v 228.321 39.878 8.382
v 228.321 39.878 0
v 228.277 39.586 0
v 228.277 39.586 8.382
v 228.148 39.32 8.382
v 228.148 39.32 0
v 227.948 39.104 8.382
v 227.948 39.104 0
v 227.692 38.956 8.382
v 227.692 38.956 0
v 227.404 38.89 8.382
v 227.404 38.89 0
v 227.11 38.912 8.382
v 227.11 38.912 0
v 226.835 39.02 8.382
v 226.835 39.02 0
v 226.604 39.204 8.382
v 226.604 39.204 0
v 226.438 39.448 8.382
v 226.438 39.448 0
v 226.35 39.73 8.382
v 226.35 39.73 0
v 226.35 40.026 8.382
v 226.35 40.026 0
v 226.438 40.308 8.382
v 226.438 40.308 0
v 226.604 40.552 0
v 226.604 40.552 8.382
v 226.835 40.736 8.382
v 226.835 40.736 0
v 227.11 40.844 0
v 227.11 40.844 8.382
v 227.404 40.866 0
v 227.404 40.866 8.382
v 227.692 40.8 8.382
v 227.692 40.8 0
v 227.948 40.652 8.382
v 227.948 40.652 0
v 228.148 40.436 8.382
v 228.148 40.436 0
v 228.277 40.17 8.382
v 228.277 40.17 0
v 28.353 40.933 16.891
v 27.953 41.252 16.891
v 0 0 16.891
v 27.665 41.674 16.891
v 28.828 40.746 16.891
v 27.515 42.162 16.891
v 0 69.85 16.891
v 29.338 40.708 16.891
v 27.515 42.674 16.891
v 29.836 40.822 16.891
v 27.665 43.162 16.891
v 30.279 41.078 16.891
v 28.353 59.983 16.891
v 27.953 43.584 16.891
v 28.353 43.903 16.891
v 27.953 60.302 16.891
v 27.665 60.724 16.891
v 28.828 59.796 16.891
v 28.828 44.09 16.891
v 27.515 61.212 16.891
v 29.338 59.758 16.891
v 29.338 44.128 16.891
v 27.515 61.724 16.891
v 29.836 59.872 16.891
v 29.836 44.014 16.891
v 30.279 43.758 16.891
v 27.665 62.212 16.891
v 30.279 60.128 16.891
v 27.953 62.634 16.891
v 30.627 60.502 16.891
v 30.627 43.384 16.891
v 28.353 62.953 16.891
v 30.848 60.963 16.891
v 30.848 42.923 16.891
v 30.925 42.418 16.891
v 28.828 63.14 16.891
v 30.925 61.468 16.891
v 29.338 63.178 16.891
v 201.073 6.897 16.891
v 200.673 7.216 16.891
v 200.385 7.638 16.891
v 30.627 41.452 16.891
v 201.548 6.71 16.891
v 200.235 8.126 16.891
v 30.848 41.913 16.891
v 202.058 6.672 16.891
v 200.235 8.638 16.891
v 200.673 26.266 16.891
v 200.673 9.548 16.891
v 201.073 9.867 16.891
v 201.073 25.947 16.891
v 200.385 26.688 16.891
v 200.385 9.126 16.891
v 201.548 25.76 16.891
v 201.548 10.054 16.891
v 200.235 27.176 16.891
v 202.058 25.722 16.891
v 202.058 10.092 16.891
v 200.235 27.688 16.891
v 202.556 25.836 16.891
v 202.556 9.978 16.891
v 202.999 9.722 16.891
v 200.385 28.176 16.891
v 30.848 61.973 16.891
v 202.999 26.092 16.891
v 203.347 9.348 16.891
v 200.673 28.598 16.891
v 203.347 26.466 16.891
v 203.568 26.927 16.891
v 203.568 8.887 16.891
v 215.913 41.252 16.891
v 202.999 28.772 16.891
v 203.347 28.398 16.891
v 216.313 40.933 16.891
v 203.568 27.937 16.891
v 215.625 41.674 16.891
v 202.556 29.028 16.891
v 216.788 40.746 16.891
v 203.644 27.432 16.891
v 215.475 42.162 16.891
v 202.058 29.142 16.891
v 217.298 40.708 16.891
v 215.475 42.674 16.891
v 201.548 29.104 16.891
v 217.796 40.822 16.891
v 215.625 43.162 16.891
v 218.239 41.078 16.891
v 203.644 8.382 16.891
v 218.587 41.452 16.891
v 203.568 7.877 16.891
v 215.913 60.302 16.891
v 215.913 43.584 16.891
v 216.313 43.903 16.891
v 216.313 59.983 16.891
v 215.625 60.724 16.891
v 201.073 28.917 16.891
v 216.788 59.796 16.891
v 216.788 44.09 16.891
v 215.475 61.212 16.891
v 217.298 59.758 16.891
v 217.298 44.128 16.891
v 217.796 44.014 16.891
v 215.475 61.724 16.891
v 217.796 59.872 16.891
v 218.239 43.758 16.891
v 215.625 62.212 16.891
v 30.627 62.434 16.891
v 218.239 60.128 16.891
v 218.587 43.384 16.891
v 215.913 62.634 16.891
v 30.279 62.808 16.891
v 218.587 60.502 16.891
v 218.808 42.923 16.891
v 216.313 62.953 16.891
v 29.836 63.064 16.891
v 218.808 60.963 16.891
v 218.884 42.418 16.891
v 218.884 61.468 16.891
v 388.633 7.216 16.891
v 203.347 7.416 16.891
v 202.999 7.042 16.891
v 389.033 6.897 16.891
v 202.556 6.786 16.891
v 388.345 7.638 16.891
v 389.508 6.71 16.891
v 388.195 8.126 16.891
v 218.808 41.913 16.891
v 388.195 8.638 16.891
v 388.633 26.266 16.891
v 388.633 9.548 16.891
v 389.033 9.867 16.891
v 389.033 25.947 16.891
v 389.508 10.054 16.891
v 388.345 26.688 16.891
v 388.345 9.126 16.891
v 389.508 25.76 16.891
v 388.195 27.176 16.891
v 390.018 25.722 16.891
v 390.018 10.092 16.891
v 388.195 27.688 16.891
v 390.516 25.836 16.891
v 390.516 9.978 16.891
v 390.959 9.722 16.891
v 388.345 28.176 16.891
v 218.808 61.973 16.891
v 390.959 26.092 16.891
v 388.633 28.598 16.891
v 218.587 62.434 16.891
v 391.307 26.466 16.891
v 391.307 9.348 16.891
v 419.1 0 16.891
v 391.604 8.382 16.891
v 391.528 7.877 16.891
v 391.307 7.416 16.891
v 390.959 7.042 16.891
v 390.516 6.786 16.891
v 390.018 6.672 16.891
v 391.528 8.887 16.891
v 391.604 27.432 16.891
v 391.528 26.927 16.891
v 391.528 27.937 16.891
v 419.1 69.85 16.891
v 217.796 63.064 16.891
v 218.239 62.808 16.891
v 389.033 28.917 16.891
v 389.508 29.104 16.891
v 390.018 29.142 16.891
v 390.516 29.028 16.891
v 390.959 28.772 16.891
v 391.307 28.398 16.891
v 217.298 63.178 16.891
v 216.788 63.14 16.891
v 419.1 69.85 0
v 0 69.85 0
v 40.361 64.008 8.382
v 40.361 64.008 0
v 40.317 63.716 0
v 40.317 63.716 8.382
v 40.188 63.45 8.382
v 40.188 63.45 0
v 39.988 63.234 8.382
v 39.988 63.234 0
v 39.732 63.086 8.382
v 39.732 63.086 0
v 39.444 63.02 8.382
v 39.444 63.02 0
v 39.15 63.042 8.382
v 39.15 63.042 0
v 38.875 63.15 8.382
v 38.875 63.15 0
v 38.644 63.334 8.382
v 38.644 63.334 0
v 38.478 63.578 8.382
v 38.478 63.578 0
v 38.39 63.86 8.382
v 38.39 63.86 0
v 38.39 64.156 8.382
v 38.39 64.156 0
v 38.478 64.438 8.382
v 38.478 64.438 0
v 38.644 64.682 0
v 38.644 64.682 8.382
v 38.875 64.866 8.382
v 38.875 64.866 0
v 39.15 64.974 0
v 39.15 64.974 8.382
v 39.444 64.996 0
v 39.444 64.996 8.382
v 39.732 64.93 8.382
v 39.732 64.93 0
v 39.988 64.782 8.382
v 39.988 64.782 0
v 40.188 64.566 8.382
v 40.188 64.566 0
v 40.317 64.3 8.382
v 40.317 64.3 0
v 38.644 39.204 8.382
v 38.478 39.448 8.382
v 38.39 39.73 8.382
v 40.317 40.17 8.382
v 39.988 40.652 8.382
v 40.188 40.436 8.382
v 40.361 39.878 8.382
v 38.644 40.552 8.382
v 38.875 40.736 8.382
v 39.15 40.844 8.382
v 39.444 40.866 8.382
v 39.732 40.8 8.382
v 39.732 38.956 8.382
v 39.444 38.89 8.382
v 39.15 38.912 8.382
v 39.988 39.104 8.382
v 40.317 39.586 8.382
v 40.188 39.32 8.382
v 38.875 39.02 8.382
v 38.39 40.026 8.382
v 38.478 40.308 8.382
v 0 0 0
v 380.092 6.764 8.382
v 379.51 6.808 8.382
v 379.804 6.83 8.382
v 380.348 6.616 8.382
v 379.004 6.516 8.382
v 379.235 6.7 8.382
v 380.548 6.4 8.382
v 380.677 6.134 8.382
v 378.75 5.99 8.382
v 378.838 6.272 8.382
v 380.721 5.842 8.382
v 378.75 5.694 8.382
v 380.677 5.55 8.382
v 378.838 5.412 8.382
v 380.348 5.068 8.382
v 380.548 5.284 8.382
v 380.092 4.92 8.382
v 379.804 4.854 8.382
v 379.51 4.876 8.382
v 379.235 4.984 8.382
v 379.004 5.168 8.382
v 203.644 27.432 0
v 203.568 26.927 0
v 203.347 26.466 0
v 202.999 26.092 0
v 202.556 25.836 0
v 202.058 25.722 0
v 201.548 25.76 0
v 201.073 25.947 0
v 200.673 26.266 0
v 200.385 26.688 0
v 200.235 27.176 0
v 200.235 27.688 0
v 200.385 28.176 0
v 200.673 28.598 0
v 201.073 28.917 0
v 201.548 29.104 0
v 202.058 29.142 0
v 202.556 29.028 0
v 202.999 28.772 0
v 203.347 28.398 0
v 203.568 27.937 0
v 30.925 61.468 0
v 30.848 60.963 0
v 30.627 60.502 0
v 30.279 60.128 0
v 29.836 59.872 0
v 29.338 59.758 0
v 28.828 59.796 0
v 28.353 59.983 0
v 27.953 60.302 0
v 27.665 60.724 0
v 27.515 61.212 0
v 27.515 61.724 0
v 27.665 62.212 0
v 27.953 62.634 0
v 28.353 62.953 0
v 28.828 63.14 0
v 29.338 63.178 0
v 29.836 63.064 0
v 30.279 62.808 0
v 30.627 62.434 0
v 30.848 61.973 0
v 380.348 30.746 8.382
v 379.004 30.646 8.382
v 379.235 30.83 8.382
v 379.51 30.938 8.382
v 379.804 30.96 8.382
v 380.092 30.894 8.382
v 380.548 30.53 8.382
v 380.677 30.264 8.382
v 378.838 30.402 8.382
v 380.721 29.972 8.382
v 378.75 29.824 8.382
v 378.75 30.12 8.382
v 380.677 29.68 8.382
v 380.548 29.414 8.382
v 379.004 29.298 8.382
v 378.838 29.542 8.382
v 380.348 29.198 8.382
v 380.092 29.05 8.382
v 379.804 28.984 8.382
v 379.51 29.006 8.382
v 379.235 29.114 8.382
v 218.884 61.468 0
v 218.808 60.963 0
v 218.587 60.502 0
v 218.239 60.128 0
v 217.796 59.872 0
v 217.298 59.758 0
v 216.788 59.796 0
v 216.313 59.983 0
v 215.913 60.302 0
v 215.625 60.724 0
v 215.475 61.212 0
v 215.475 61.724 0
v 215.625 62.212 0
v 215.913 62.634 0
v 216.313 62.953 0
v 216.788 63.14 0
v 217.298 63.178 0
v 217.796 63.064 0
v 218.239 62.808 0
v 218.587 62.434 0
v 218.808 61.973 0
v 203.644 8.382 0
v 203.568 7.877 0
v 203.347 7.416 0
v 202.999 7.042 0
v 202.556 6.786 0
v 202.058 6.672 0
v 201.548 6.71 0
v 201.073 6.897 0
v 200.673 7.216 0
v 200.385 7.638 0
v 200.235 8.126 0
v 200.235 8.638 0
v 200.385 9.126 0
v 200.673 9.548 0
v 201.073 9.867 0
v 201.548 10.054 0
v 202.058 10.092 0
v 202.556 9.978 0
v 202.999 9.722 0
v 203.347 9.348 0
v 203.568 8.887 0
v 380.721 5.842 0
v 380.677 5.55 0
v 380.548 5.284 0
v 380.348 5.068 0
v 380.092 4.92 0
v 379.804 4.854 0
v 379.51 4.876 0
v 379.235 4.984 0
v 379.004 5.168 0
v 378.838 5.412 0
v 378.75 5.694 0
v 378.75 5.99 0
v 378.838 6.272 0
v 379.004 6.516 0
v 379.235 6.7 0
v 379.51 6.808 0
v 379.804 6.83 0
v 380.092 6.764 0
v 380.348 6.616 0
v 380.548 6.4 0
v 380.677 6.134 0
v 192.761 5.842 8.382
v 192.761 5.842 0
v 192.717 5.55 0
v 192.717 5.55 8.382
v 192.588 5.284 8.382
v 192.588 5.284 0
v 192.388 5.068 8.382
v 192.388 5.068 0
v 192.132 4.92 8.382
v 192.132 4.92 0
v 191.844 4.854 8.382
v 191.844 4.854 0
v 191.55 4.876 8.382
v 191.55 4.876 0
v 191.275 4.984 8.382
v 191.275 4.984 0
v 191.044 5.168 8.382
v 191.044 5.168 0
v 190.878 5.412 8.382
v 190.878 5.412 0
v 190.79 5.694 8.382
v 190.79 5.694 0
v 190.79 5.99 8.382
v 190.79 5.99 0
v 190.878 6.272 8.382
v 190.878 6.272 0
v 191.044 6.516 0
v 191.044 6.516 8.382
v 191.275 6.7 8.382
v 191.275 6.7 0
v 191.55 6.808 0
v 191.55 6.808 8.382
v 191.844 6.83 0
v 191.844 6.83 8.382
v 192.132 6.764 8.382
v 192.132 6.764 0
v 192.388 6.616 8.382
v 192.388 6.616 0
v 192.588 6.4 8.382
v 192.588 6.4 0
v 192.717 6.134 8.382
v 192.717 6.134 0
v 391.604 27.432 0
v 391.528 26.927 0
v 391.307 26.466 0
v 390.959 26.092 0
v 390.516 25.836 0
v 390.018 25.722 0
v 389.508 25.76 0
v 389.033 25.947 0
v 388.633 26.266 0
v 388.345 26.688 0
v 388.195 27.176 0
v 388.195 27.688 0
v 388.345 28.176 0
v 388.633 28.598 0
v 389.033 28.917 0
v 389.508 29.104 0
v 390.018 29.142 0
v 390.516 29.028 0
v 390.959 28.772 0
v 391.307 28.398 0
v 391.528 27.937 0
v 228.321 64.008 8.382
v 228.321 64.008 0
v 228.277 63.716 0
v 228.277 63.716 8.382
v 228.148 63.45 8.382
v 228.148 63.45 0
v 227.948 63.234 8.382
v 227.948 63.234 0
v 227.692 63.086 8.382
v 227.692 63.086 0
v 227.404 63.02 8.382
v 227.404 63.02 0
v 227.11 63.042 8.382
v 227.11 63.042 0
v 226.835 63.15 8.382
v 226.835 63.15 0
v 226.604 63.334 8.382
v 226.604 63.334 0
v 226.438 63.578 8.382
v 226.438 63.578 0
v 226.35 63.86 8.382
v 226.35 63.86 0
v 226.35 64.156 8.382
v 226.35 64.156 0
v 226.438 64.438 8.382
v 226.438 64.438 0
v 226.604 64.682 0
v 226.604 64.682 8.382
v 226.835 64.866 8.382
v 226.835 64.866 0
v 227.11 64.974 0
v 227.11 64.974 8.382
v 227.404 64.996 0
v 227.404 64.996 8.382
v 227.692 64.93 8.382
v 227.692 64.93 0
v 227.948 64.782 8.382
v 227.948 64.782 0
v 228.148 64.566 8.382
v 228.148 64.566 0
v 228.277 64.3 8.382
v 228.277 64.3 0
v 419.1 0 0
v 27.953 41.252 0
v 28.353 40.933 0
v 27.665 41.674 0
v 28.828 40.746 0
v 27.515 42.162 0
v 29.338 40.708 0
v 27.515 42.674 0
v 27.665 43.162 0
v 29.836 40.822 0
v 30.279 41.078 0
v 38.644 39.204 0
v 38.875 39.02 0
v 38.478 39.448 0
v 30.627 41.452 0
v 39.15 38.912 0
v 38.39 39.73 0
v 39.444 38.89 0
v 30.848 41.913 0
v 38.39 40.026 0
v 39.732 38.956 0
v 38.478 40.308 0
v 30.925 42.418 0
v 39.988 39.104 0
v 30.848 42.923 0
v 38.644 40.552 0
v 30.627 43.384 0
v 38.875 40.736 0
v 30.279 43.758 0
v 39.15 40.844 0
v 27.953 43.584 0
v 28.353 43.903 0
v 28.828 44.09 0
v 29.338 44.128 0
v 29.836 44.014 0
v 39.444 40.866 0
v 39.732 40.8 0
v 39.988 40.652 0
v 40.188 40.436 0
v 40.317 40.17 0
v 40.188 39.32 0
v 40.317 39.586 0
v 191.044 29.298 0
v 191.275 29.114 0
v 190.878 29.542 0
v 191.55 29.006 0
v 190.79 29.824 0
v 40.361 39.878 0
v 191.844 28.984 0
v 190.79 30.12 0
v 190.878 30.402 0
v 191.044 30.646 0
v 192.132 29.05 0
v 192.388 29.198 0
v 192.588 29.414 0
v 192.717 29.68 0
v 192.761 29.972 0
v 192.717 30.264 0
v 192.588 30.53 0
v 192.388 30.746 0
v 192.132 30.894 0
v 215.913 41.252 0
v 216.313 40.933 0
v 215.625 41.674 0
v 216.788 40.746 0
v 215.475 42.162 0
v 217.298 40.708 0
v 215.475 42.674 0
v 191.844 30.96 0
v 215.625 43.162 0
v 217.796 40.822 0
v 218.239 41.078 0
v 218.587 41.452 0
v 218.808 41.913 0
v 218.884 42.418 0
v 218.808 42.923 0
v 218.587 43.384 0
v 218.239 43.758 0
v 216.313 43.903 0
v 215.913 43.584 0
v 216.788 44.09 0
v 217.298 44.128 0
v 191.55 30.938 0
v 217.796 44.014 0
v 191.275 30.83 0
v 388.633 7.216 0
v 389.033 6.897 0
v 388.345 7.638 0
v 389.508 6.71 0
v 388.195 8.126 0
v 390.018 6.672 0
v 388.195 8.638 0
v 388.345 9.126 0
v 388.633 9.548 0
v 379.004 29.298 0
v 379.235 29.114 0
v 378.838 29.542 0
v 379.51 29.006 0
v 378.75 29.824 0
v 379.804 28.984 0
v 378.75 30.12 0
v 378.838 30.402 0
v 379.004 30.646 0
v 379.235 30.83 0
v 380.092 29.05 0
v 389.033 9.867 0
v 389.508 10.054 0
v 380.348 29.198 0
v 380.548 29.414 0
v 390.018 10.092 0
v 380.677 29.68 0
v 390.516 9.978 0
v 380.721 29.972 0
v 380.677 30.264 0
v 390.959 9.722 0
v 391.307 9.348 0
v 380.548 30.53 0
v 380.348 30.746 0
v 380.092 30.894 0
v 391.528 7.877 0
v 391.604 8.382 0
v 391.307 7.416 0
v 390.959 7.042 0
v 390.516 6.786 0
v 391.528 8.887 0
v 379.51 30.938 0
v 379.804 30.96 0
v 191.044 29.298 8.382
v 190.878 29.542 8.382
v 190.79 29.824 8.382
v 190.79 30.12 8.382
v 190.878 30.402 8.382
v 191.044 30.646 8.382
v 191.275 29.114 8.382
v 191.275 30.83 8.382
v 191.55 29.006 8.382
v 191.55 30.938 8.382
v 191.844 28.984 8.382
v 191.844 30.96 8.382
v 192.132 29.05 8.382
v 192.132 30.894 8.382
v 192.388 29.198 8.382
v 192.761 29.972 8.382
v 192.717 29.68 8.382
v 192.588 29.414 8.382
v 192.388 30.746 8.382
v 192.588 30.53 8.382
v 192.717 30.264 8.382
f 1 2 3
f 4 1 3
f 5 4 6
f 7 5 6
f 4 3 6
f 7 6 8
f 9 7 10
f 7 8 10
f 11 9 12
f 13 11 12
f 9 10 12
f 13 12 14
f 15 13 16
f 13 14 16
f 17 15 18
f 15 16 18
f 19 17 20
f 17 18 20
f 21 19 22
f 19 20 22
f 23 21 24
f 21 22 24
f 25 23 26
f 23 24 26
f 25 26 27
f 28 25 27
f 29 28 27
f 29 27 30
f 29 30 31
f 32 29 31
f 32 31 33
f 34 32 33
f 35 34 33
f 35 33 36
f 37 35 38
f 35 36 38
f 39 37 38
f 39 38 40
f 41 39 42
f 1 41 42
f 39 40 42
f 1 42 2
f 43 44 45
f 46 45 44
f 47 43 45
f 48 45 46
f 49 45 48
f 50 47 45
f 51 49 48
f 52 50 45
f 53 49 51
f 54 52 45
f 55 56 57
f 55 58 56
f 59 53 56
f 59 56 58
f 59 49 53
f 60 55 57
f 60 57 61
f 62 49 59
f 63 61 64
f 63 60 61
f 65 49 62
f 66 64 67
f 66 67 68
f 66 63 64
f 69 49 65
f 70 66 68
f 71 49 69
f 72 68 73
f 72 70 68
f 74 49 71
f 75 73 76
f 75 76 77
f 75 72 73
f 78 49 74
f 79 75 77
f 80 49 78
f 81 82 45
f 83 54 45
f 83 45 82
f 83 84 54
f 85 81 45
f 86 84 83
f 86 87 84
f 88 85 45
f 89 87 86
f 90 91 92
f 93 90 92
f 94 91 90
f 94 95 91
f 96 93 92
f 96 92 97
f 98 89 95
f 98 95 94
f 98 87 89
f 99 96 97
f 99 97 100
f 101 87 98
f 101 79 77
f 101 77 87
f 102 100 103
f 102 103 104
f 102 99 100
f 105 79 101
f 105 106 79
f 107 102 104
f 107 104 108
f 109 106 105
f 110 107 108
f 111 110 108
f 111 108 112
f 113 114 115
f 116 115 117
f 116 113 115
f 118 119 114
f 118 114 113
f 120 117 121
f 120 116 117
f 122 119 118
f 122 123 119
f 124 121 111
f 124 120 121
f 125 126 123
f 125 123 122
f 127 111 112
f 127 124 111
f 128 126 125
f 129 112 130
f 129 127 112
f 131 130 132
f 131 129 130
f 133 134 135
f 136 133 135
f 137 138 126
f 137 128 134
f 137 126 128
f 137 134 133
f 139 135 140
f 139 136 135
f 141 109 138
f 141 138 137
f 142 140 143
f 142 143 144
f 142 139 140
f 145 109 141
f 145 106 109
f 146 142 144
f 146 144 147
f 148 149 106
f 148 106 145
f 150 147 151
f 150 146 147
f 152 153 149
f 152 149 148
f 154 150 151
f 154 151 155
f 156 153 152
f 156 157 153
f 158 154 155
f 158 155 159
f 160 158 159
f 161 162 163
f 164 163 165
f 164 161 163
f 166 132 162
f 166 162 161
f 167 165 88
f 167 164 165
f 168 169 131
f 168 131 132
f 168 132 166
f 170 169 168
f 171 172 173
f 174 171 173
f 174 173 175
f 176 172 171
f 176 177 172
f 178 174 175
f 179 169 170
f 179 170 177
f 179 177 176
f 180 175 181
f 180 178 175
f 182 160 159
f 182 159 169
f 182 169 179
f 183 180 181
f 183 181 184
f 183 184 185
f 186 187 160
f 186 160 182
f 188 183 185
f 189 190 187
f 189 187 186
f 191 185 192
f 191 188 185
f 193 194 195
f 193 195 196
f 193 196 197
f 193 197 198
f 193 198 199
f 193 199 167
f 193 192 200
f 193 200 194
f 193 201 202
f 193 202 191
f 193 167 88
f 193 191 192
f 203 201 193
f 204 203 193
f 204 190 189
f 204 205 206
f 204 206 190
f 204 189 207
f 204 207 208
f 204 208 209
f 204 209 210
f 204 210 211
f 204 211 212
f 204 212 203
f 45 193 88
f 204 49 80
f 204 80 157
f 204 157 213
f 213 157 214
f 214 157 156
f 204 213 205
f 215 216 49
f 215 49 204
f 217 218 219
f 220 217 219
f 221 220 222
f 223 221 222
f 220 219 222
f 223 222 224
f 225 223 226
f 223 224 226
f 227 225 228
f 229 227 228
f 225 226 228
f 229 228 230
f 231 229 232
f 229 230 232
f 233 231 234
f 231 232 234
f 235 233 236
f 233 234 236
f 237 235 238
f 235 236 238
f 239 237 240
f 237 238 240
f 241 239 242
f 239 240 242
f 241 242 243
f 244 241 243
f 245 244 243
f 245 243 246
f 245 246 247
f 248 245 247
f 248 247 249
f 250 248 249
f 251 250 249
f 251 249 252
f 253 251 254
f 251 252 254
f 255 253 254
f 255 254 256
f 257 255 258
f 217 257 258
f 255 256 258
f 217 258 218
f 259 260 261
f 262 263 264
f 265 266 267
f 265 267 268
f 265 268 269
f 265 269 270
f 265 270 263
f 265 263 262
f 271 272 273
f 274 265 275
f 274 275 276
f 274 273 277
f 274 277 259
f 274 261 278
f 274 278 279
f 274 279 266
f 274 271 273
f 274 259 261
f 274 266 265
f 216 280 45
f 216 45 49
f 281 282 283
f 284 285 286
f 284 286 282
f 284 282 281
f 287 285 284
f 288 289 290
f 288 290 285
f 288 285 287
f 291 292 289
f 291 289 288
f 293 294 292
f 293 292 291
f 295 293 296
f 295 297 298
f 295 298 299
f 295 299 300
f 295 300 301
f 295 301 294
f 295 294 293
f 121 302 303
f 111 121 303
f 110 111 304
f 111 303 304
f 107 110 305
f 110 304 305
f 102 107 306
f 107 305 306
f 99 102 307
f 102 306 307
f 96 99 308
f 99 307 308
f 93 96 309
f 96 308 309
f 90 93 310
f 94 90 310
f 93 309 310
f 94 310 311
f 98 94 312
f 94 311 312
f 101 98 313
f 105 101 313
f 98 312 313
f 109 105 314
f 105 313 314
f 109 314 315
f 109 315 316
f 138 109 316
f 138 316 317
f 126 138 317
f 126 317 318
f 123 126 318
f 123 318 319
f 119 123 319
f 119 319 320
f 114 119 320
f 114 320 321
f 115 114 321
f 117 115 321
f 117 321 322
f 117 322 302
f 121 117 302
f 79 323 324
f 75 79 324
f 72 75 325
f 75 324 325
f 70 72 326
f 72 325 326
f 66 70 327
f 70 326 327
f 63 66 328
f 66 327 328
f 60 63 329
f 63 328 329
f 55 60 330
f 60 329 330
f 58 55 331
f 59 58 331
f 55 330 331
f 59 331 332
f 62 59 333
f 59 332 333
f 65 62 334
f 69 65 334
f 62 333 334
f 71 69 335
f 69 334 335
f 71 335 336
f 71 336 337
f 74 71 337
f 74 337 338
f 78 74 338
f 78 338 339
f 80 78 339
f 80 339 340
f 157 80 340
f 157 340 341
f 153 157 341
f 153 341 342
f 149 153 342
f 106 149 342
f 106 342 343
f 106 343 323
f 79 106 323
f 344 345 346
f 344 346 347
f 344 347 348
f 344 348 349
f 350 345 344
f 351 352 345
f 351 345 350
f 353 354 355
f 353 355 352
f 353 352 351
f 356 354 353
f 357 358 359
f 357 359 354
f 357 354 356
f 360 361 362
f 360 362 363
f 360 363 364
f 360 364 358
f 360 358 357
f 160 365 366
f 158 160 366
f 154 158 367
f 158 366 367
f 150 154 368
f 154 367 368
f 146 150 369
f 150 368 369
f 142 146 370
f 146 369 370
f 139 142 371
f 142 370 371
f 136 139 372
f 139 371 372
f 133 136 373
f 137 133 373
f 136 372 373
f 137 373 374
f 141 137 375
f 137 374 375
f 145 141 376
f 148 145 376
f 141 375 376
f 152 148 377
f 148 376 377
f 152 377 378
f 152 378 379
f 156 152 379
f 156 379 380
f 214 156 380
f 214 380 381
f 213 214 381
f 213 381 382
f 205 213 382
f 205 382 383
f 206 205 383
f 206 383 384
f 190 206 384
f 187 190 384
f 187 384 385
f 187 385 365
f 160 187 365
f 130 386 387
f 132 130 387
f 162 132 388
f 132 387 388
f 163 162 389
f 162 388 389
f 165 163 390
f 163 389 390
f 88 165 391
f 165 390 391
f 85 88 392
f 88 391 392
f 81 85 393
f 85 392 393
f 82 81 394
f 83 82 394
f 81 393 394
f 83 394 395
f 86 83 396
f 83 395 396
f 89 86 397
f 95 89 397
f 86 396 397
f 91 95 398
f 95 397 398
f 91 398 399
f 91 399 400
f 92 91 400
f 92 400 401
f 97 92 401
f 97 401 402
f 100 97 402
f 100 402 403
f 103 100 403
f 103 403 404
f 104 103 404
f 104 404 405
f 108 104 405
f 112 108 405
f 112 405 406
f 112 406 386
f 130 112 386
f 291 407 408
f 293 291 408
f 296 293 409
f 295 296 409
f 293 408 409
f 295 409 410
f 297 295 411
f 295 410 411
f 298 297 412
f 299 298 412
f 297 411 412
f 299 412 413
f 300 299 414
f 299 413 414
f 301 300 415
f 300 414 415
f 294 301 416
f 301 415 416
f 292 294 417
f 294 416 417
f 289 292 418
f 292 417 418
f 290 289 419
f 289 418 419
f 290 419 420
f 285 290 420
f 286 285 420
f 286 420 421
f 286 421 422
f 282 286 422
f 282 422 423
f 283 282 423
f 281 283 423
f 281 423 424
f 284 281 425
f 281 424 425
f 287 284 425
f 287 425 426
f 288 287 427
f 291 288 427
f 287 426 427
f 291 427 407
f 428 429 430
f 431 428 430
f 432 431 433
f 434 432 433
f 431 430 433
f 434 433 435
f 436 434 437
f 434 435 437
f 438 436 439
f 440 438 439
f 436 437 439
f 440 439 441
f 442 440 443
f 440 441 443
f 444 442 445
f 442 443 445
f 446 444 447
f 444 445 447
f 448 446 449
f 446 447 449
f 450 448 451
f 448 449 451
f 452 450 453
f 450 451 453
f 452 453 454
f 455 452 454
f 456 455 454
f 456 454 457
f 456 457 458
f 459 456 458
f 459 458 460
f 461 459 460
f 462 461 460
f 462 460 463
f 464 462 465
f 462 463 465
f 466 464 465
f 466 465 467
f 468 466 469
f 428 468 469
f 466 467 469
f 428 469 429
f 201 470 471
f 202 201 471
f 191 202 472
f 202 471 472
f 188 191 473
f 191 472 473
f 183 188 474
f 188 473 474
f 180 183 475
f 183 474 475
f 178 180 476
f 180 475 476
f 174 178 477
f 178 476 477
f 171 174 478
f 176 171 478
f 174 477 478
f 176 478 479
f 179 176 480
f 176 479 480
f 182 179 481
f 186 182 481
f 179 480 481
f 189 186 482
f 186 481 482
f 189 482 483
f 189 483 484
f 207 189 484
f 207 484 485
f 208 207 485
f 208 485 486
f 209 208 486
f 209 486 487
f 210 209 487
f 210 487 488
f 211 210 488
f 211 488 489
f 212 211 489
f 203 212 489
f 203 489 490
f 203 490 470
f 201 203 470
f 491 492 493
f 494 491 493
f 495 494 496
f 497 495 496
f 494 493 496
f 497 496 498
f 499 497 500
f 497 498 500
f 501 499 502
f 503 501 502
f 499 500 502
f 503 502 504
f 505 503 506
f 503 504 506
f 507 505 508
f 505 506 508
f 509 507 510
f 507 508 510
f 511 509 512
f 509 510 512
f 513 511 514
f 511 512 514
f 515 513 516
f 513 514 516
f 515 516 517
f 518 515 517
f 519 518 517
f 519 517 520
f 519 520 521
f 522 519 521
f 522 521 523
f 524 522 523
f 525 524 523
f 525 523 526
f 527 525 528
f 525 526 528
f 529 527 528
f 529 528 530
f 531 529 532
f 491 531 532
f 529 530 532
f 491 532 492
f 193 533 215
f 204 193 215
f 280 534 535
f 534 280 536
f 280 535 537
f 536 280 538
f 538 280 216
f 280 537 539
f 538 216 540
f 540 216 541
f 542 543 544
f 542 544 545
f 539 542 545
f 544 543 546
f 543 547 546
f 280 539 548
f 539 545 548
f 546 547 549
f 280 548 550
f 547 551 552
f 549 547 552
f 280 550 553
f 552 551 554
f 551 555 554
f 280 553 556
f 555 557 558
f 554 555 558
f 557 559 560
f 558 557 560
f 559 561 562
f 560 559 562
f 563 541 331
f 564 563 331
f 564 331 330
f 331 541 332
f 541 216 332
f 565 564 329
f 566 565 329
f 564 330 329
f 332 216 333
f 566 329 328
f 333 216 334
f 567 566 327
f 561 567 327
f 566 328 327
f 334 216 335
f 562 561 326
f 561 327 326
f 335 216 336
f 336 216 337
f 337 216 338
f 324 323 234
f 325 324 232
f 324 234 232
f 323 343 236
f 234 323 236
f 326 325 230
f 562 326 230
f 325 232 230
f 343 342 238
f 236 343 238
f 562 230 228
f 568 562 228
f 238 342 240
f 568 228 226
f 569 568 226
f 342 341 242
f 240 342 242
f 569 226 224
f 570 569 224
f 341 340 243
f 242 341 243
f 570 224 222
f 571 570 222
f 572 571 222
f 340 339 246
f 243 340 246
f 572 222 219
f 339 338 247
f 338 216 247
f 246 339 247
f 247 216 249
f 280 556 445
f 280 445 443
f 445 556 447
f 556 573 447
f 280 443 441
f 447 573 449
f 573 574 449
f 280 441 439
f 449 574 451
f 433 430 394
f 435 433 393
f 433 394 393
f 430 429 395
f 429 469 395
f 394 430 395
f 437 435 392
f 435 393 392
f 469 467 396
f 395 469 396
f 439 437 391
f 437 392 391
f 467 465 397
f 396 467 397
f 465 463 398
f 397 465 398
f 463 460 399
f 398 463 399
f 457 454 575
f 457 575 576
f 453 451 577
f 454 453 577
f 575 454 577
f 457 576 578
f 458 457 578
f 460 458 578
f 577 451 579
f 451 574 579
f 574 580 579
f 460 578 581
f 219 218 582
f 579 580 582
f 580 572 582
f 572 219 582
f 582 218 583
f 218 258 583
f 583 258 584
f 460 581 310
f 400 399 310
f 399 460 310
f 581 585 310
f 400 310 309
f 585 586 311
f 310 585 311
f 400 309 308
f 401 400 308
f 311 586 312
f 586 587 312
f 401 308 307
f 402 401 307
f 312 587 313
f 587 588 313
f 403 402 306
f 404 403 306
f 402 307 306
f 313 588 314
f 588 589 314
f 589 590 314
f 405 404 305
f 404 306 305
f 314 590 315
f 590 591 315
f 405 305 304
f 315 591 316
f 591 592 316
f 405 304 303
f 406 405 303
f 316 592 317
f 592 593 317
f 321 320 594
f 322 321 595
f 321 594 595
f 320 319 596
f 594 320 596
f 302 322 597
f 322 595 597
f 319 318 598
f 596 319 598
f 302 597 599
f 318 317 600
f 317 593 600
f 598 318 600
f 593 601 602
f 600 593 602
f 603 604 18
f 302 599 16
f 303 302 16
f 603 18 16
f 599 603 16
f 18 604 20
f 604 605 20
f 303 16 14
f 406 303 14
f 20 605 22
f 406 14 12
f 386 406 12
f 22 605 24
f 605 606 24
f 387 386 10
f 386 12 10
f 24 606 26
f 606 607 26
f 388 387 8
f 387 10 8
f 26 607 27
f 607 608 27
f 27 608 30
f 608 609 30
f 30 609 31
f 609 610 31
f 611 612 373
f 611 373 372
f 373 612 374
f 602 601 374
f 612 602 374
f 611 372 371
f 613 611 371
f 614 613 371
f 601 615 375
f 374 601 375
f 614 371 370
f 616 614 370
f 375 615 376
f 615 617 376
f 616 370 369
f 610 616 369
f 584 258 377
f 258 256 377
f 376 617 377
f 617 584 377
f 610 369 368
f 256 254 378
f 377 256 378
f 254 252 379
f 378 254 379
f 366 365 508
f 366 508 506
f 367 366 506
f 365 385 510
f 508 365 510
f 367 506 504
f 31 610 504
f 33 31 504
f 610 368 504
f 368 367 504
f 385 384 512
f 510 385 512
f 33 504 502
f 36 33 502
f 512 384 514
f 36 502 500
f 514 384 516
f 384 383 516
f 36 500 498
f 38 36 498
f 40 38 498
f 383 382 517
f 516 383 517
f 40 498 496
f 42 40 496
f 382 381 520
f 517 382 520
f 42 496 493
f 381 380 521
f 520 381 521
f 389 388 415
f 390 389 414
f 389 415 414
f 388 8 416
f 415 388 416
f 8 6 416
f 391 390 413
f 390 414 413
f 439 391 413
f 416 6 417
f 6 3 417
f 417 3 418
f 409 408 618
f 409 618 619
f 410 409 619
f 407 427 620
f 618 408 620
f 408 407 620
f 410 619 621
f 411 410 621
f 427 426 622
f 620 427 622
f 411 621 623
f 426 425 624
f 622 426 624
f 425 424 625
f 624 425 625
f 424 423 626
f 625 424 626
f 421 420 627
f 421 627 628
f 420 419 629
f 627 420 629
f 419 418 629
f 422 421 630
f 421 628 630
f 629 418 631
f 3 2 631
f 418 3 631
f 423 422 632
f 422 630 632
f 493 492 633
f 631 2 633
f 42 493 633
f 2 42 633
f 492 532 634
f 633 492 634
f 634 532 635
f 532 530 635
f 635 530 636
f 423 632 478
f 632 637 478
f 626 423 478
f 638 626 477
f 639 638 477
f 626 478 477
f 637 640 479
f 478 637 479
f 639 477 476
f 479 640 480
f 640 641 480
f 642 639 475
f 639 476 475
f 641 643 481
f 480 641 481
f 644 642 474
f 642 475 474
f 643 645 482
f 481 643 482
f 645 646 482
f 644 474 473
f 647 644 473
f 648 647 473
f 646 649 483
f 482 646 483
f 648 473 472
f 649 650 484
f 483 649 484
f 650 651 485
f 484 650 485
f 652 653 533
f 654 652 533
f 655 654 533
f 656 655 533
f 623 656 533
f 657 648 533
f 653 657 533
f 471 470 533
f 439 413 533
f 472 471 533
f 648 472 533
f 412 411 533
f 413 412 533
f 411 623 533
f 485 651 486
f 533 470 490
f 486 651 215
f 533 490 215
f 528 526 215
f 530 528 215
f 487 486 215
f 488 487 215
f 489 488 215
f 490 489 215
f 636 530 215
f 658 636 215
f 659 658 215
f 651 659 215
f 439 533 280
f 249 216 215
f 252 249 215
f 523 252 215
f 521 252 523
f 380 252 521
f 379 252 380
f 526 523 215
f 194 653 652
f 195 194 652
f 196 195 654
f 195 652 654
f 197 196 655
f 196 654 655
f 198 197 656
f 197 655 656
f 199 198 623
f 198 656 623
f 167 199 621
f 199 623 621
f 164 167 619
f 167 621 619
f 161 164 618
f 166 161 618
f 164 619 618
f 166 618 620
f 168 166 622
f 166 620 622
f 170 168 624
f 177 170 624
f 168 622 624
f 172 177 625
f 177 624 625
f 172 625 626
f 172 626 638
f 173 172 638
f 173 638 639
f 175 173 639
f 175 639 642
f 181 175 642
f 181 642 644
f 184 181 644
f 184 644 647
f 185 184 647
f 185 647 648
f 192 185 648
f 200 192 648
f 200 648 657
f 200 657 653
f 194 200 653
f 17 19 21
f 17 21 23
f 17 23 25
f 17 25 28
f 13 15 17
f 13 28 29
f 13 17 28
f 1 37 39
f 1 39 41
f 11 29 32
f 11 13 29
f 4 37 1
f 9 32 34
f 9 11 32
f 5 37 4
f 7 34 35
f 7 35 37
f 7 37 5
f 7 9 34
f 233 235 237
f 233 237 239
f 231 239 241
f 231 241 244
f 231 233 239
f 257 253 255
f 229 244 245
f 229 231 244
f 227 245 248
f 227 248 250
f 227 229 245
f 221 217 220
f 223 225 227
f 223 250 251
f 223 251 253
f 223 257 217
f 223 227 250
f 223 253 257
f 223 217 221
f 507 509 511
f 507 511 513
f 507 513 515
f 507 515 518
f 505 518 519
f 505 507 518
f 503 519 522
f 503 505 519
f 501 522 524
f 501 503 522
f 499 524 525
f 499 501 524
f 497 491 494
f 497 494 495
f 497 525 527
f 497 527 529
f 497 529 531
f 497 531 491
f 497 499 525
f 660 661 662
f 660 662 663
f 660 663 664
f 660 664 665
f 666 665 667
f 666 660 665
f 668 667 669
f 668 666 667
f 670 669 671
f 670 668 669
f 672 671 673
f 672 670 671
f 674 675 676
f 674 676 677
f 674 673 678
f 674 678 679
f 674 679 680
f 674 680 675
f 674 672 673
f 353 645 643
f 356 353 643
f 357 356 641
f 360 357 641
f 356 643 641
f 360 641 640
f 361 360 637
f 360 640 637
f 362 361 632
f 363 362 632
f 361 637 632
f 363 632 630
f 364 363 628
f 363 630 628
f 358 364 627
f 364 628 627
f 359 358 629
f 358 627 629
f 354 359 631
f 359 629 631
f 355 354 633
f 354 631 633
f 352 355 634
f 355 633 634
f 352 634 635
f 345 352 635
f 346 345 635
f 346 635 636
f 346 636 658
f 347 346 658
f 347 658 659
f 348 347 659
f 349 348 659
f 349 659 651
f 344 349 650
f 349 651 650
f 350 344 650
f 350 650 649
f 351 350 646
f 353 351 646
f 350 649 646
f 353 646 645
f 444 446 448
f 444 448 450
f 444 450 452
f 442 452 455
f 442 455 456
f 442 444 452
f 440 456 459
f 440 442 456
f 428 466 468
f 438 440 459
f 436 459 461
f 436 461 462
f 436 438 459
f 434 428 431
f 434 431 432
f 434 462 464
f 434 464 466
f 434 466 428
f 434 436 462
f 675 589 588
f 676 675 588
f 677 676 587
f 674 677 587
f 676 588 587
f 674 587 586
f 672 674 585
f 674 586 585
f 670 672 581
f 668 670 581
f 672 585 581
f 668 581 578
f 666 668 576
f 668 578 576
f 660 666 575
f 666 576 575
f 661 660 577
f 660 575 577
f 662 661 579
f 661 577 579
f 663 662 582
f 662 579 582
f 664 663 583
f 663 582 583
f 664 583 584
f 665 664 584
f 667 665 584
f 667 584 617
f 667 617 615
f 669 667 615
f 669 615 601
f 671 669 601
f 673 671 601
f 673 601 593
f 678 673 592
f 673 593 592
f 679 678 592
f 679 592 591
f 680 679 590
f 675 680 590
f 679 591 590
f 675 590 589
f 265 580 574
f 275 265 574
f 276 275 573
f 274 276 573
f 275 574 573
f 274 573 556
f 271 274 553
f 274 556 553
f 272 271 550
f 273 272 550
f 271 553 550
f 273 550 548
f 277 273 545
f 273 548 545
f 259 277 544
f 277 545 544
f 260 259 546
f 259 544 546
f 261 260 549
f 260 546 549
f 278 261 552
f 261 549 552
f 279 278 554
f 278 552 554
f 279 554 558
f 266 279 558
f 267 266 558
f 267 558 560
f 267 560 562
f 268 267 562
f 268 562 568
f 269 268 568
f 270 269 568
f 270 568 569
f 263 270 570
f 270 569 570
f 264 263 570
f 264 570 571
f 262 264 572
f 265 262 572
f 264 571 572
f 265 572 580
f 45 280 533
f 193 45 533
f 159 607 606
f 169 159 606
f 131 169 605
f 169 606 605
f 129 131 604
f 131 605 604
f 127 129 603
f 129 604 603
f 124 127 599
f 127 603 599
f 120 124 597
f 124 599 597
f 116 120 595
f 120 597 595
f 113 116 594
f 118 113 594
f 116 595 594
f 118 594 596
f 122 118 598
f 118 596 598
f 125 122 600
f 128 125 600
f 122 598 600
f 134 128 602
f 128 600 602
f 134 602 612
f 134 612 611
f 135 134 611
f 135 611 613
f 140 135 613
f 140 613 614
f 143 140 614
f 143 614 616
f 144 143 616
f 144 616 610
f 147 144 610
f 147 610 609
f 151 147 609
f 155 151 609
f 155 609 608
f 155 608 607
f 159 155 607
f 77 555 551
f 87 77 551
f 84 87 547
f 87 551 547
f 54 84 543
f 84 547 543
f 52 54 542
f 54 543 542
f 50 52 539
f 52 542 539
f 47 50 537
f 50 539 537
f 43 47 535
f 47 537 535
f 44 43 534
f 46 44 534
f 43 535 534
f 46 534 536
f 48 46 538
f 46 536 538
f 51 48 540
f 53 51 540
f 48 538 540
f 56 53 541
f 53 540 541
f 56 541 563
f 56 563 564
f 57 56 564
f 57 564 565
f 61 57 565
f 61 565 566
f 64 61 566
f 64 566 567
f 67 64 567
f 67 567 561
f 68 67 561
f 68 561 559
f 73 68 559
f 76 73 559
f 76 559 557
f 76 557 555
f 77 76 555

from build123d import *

# Parameters (mm, degrees)
F0_W     = 419.1
F0_H     = 69.85
F1_DEPTH = 16.891
F2_R     = 0.9906
F3_DEPTH = 8.382
F4_R     = 1.7145
F5_DEPTH = 25.4


with BuildPart() as f1:
    # F0 (on Top) → F1 (new body)
    with BuildSketch(Plane.XY):
        with Locations((209.55, 34.925)):
            Rectangle(F0_W, F0_H)
    extrude(amount=F1_DEPTH)

    # F2 (on face) → F3 (cut)
    with BuildSketch(Plane(origin=(0, 0, 0), x_dir=(1, 0, 0), z_dir=(0, 0, -1))):
        with Locations((379.73, -5.842)):
            Circle(F2_R)
        with Locations((379.73, -29.972)):
            Circle(F2_R)
        with Locations((227.33, -39.878)):
            Circle(F2_R)
        with Locations((227.33, -64.008)):
            Circle(F2_R)
        with Locations((39.37, -64.008)):
            Circle(F2_R)
        with Locations((191.77, -29.972)):
            Circle(F2_R)
        with Locations((39.37, -39.878)):
            Circle(F2_R)
        with Locations((191.77, -5.842)):
            Circle(F2_R)
    extrude(amount=-F3_DEPTH, mode=Mode.SUBTRACT)

    # F4 (on face) → F5 (cut)
    with BuildSketch(Plane(origin=(0, 0, 0), x_dir=(1, 0, 0), z_dir=(0, 0, -1))):
        with Locations((389.89, -8.382)):
            Circle(F4_R)
        with Locations((389.89, -27.432)):
            Circle(F4_R)
        with Locations((217.17, -42.418)):
            Circle(F4_R)
        with Locations((217.17, -61.468)):
            Circle(F4_R)
        with Locations((29.21, -42.418)):
            Circle(F4_R)
        with Locations((29.21, -61.468)):
            Circle(F4_R)
        with Locations((201.93, -27.432)):
            Circle(F4_R)
        with Locations((201.93, -8.382)):
            Circle(F4_R)
        with Locations((-173.99, -42.418)):
            Circle(F4_R)
        with Locations((-173.99, -61.468)):
            Circle(F4_R)
        with Locations((-377.19, -42.418)):
            Circle(F4_R)
        with Locations((-377.19, -61.468)):
            Circle(F4_R)
    extrude(amount=-F5_DEPTH, mode=Mode.SUBTRACT)


solid = f1.part
